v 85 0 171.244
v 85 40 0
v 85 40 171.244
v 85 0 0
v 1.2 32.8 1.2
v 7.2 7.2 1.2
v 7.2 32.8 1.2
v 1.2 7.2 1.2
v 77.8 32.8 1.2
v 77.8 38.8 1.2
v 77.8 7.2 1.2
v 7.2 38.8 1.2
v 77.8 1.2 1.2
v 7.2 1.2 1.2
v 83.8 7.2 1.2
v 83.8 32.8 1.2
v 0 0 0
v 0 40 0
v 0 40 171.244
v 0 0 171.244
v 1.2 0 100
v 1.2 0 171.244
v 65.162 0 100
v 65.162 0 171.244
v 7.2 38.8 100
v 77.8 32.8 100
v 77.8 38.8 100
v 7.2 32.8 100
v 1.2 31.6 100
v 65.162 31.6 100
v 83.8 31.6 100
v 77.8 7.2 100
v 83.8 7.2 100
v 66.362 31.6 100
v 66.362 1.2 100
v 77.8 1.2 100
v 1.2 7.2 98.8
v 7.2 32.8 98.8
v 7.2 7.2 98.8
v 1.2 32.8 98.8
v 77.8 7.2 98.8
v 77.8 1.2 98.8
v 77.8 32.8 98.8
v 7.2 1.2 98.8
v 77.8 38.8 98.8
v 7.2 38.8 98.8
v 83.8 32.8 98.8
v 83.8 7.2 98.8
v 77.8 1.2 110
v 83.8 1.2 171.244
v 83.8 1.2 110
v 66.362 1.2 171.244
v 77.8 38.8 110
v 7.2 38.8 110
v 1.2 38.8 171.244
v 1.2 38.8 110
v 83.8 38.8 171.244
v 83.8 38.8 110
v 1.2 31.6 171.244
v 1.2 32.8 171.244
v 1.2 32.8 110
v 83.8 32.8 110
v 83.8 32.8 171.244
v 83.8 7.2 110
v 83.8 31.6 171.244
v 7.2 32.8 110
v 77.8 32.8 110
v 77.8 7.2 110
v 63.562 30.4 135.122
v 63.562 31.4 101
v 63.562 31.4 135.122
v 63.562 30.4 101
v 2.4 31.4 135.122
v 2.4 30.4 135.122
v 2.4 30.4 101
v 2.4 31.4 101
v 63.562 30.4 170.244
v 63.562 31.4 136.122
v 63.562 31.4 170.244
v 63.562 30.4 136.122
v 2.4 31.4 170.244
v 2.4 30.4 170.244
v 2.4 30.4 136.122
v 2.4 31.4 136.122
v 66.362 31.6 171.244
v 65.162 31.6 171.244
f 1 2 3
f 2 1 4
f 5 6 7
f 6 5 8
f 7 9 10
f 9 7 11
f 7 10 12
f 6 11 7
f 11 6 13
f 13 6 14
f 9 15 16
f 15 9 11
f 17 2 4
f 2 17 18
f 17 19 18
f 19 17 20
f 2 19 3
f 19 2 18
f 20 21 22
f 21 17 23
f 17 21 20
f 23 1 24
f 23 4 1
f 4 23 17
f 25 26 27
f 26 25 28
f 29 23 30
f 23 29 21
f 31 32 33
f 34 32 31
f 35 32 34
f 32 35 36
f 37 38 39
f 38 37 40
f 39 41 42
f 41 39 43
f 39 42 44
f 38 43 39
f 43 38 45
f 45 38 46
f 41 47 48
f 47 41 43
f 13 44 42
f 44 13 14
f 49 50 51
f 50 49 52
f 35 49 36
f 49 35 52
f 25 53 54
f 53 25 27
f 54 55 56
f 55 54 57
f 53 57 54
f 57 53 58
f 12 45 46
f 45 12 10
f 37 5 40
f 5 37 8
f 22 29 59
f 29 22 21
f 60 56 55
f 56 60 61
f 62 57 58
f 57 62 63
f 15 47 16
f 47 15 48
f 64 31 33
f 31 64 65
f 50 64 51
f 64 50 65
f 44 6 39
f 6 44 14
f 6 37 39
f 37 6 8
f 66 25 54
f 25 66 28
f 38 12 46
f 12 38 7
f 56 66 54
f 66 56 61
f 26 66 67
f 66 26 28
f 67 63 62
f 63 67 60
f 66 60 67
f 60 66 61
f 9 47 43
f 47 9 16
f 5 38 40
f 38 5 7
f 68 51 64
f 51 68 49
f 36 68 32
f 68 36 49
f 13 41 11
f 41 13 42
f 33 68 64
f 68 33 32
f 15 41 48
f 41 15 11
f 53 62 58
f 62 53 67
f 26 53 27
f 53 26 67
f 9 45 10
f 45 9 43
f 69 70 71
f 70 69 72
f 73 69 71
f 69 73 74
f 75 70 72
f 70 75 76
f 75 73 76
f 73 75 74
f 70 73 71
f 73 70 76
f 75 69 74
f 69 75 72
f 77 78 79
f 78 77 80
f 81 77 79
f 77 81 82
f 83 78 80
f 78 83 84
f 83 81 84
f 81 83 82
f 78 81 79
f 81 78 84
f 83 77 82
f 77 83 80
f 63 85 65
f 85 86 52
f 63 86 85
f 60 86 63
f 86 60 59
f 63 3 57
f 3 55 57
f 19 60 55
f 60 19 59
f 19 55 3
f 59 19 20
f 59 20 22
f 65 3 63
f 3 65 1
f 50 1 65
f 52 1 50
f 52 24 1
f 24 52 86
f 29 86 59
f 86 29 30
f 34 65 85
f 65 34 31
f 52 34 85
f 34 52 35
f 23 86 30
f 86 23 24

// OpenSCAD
standing_height = 100;
screen_diagonal_inches = 27;
wood_thickness = 1.2;
kantholz = 6;
kantholz_poke = 10;

/* bottom box */
// tabletop
tabletop_depth = 40;
tabletop_width = 85;
side_height = standing_height - 2 * wood_thickness;
// bottom
cube([tabletop_width, tabletop_depth, wood_thickness]);
// top
translate([0, 0, standing_height - wood_thickness])
cube([tabletop_width, tabletop_depth, wood_thickness]);
// front
translate([0, 0, wood_thickness])
cube([tabletop_width, wood_thickness, standing_height - 2 * wood_thickness]);
// back
translate([0, tabletop_depth - wood_thickness, wood_thickness])
cube([tabletop_width, wood_thickness, side_height]);
// left
translate([0, wood_thickness, wood_thickness])
cube([wood_thickness, tabletop_depth - 2 * wood_thickness, standing_height - 2 * wood_thickness]);
// right
translate([tabletop_width - wood_thickness, wood_thickness, wood_thickness])
cube([wood_thickness, tabletop_depth - 2 * wood_thickness, standing_height - 2 * wood_thickness]);

// Kantholz my beloved
kantholz_dx = tabletop_width - kantholz - 2 * wood_thickness;
kantholz_dy = - 2 * wood_thickness - kantholz;
kantholz_height = standing_height + kantholz_poke - wood_thickness;
translate([wood_thickness, wood_thickness, wood_thickness])
cube([kantholz, kantholz, kantholz_height - kantholz_poke - wood_thickness]);
translate([wood_thickness, wood_thickness + tabletop_depth + kantholz_dy, wood_thickness])
cube([kantholz, kantholz, kantholz_height]);
translate([wood_thickness + kantholz_dx, wood_thickness, wood_thickness])
cube([kantholz, kantholz, kantholz_height]);
translate([wood_thickness + kantholz_dx, wood_thickness + tabletop_depth + kantholz_dy, wood_thickness])
cube([kantholz, kantholz, kantholz_height]);

// monitors
bezel = 0.5;
padding = 2 * bezel;
screen_aspect = 16/9;
in_to_cm = 2.54;
screen_diagonal = screen_diagonal_inches * in_to_cm;
screen_height = bezel + screen_diagonal / sqrt(1 + (screen_aspect)^2);
screen_width = bezel + screen_aspect * screen_height;
height_bottom = padding + standing_height;
screen_dy = 3 * wood_thickness + kantholz;
screen_dx = 2 * wood_thickness;
translate([screen_dx, tabletop_depth - screen_dy, height_bottom])
cube([screen_width, 1, screen_height]);
translate([screen_dx, tabletop_depth - screen_dy, height_bottom + padding + screen_height])
cube([screen_width, 1, screen_height]);
top_screen_top = height_bottom + padding + 2 * screen_height;

top_wall_height = top_screen_top - standing_height + padding;

// monitor walls
translate([0, tabletop_depth - wood_thickness, standing_height])
cube([tabletop_width, wood_thickness, top_wall_height]);
translate([wood_thickness, tabletop_depth - wood_thickness - kantholz - wood_thickness, standing_height])
cube([tabletop_width - 2 * wood_thickness, wood_thickness, top_wall_height]);

// left side wall
translate([0, 0, standing_height])
cube([wood_thickness, tabletop_depth, top_wall_height]);

// right side wall (inner)
translate([screen_width + 4 * padding, wood_thickness, standing_height])
cube([wood_thickness, tabletop_depth - 3 * wood_thickness - kantholz, top_wall_height]);

// right side wall (outer)
translate([tabletop_width - wood_thickness, wood_thickness, standing_height])
cube([wood_thickness, tabletop_depth - 2 * wood_thickness, top_wall_height]);

// front wall
front_wall_x = screen_width + 4 * padding;
translate([front_wall_x, 0, standing_height])
cube([tabletop_width - front_wall_x, wood_thickness, top_wall_height]);
